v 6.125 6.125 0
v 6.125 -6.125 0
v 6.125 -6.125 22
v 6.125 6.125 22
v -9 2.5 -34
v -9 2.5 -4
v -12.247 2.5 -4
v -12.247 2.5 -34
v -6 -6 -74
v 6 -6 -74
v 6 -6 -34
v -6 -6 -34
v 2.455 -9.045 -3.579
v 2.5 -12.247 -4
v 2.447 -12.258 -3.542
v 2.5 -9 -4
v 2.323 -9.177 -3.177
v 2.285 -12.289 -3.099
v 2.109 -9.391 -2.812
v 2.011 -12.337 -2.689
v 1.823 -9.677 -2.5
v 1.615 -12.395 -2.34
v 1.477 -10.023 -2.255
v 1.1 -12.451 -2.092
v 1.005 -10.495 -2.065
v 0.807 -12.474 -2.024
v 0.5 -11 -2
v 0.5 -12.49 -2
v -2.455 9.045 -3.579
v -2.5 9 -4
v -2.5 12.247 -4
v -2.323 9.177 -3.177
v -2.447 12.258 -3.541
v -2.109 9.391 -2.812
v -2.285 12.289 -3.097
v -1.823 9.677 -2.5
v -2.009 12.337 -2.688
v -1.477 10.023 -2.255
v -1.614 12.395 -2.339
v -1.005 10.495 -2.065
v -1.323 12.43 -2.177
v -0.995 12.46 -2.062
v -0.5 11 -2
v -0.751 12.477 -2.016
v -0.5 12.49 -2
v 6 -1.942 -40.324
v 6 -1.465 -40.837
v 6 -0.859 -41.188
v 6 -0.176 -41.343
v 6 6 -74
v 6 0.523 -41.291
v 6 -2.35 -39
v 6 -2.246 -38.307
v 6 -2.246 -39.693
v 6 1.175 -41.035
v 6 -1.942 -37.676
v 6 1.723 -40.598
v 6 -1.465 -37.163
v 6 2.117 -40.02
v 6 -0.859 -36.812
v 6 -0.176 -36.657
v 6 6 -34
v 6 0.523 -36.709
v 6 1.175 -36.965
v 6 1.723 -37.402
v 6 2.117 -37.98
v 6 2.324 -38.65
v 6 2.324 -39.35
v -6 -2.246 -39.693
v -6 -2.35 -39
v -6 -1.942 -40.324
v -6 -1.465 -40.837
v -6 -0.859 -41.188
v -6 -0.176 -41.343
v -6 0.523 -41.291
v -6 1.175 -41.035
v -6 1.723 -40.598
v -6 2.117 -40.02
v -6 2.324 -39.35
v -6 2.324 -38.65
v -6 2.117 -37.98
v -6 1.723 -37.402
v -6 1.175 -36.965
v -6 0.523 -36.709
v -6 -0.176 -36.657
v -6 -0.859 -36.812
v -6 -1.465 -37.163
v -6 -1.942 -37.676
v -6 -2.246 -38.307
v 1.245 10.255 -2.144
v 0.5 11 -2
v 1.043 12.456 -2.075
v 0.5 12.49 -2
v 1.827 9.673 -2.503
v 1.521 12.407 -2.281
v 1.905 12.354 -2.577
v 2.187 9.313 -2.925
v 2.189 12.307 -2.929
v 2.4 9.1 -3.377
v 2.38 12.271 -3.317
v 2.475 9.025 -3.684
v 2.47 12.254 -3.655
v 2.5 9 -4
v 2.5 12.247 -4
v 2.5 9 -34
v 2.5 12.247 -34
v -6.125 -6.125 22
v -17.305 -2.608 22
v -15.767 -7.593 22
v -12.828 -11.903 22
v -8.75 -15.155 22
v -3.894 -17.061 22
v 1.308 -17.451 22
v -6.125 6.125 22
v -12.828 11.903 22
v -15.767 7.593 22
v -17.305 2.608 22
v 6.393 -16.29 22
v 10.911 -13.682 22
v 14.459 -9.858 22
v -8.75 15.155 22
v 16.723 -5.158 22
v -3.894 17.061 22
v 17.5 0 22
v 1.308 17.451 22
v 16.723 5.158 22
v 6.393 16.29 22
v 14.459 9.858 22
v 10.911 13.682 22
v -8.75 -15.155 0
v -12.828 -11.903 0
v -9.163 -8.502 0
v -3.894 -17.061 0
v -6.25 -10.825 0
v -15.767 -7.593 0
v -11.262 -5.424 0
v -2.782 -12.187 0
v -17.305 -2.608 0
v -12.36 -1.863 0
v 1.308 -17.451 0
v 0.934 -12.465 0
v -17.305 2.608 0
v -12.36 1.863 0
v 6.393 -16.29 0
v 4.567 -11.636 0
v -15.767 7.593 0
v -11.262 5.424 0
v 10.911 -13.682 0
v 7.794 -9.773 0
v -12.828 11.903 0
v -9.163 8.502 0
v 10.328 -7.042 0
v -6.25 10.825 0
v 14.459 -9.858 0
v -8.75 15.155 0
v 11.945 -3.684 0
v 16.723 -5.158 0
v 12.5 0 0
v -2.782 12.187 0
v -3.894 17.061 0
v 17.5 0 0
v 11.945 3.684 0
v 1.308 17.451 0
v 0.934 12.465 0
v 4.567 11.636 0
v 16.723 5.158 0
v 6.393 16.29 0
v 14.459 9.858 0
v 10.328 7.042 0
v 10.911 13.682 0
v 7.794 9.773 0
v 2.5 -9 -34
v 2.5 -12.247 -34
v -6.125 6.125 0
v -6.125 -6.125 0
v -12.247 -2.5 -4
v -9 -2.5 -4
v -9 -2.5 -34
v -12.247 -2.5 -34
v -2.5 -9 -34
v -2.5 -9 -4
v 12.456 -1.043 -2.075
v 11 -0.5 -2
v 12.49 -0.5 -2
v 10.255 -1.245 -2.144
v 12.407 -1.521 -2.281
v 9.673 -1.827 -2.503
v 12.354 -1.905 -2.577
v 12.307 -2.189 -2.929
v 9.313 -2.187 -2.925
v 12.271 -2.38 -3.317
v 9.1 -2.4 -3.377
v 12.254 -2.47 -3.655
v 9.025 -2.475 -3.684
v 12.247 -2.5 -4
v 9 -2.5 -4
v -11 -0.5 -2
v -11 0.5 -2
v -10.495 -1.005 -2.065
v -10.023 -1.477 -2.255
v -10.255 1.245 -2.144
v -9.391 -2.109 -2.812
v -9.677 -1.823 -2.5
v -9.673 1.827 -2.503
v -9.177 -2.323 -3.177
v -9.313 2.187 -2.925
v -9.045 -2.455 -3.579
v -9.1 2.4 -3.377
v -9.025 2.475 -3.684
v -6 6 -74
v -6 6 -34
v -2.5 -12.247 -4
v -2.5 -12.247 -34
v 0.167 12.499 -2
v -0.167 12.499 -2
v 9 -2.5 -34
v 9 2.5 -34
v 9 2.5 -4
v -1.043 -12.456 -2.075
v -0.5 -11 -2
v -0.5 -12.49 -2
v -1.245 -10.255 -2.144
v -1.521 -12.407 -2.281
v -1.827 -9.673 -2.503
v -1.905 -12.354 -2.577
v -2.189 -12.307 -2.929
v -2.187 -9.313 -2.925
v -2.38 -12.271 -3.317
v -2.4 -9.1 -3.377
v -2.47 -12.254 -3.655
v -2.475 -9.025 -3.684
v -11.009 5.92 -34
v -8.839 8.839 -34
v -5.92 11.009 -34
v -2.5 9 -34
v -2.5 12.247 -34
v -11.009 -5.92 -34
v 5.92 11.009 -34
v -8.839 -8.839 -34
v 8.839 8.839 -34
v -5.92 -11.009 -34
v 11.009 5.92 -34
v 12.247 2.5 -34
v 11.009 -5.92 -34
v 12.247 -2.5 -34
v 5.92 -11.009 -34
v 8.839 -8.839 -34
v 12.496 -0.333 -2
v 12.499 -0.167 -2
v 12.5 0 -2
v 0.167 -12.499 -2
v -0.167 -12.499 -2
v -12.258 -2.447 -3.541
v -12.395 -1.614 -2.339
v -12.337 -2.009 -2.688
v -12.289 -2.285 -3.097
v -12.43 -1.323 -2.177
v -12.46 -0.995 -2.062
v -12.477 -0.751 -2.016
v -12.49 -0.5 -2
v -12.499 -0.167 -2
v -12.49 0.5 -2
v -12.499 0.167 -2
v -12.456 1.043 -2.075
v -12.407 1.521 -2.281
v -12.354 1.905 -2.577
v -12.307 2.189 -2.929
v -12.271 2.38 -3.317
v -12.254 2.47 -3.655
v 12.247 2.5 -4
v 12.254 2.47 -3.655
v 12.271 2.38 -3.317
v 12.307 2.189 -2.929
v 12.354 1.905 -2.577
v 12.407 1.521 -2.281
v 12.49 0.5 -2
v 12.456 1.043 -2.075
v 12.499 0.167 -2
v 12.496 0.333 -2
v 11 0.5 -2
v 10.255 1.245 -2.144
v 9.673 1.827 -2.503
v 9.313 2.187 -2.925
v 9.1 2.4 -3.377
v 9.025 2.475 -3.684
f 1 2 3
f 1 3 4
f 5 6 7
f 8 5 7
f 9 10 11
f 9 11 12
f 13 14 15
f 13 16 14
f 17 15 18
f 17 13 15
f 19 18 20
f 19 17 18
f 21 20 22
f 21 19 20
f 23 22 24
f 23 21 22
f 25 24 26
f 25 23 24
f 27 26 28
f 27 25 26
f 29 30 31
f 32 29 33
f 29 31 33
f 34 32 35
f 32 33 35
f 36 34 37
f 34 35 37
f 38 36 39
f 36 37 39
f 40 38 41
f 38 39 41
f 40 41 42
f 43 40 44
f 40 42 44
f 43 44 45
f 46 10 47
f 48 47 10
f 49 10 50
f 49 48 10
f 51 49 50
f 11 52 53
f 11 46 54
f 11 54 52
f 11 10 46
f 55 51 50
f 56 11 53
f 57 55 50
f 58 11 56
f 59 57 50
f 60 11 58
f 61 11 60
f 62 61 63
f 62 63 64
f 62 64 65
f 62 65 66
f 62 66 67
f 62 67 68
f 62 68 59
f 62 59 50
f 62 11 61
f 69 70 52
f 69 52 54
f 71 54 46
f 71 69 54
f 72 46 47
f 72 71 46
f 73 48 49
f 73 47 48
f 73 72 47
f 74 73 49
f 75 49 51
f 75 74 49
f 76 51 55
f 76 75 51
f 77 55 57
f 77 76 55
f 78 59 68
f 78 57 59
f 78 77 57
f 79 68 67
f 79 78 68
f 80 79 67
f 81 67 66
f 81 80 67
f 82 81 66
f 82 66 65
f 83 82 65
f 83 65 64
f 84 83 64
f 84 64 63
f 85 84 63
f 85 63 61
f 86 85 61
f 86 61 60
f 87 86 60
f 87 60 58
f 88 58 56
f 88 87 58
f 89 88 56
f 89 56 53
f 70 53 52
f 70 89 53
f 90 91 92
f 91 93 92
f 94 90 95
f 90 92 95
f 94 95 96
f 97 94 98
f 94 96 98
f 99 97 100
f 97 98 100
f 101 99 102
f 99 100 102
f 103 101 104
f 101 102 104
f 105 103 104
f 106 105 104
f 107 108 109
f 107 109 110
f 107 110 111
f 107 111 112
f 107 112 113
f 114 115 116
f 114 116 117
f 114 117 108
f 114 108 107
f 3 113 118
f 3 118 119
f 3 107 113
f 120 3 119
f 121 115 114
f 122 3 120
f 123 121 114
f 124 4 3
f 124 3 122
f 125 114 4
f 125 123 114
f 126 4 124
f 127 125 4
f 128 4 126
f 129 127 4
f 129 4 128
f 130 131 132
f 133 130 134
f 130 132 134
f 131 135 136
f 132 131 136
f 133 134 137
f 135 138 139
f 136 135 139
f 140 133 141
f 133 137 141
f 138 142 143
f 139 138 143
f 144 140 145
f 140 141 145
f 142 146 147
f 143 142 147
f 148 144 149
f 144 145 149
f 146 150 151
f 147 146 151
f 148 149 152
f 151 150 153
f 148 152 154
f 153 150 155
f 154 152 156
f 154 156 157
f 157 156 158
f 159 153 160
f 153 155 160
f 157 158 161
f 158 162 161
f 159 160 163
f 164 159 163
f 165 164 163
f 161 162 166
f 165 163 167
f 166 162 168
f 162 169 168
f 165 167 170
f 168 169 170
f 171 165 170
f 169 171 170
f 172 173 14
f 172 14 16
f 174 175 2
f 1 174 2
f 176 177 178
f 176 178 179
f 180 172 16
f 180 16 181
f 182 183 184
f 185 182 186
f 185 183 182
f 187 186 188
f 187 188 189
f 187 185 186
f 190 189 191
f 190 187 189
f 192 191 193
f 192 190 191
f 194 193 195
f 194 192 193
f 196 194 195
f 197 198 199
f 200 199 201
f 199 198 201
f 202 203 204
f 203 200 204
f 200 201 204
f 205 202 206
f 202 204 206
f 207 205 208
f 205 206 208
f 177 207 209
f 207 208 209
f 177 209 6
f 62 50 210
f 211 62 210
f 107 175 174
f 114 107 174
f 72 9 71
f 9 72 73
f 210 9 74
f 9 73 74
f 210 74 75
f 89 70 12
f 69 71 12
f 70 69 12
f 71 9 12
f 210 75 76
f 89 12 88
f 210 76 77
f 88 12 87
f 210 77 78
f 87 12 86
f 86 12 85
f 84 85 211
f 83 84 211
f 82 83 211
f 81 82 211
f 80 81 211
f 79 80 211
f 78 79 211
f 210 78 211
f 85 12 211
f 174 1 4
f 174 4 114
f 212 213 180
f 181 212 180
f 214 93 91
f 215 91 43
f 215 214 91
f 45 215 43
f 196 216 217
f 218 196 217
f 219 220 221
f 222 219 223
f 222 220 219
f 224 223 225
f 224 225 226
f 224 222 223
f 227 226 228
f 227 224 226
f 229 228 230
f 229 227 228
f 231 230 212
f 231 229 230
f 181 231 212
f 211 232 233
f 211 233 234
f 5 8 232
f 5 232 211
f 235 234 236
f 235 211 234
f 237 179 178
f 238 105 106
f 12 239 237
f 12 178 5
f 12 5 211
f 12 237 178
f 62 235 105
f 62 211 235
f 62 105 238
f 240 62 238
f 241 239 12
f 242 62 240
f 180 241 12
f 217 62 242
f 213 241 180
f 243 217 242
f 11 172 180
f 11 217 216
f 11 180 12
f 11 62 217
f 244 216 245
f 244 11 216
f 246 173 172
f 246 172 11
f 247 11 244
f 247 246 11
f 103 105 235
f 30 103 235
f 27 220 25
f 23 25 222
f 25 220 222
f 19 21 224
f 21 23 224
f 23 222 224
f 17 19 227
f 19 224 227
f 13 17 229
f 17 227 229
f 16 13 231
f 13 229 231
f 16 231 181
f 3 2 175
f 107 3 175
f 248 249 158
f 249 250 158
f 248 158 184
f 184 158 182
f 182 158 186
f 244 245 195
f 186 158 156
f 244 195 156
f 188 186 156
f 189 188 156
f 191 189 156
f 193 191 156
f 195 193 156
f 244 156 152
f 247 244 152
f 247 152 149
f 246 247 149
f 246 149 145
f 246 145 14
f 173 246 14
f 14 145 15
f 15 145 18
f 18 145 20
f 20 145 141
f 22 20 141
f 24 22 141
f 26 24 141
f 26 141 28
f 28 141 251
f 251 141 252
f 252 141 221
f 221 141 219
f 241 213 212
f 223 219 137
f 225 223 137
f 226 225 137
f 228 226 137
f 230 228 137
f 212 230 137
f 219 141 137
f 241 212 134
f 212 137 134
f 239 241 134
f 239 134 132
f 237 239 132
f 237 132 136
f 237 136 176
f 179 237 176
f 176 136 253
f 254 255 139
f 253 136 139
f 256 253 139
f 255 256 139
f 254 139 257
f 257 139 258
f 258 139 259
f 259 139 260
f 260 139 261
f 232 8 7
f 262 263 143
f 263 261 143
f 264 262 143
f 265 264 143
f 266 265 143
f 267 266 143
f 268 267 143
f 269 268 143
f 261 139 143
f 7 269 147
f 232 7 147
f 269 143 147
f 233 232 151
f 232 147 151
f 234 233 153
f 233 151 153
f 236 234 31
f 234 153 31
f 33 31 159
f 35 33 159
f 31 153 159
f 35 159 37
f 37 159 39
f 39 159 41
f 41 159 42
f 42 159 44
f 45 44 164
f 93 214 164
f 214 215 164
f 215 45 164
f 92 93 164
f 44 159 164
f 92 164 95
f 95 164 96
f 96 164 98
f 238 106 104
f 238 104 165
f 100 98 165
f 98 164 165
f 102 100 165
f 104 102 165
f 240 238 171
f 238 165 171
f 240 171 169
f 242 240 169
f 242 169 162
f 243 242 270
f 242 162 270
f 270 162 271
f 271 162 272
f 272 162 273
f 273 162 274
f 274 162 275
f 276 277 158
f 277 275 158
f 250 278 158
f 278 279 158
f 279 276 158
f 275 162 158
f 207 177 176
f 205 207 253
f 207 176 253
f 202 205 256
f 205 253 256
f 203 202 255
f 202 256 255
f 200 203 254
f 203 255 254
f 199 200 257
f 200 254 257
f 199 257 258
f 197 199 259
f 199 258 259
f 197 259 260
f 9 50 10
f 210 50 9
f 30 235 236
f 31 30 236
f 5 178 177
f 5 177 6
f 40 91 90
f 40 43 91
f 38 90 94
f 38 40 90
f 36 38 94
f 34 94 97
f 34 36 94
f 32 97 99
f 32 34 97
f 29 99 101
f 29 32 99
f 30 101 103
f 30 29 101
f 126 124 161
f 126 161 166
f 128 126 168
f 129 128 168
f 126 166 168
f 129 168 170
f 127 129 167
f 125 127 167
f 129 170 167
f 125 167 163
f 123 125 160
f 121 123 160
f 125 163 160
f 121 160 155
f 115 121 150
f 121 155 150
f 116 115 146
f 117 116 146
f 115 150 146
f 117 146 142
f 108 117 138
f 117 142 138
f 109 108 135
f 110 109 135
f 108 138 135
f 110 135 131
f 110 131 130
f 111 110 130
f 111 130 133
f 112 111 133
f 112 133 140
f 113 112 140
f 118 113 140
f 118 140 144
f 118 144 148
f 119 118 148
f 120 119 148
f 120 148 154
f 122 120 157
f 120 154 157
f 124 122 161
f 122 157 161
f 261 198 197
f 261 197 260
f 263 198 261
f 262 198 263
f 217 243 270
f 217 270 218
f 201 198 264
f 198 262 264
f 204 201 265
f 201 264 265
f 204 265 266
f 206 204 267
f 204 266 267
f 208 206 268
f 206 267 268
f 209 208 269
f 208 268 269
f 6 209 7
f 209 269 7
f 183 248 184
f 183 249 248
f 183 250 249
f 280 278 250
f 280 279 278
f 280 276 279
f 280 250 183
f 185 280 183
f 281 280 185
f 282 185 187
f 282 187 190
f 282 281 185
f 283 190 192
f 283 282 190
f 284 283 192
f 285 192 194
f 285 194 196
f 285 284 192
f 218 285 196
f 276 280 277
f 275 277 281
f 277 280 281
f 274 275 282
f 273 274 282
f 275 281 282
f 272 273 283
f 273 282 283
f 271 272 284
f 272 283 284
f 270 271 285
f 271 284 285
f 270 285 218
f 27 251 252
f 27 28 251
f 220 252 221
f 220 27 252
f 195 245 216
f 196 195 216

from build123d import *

# Parameters (mm, degrees)
ESBO_O1_R                  = 17.5
RESSALTO_EXTRUS_O1_DEPTH   = 22
ESBO_O2_W                  = 12.25
ESBO_O2_H                  = 12.25
CORTE_EXTRUS_O1_DEPTH      = 25
ESBO_O3_R                  = 12.5
RESSALTO_EXTRUS_O2_DEPTH   = 34
ESBO_O4_W                  = 5
ESBO_O4_H                  = 6
ESBO_O4_W_2                = 6
ESBO_O4_H_2                = 5
CORTE_EXTRUS_O2_DEPTH      = 32
FILETE2_R                  = 2
FILETE3_R                  = 2
FILETE4_R                  = 2
FILETE5_R                  = 2
ESBO_O5_W                  = 12
ESBO_O5_H                  = 12
RESSALTO_EXTRUS_O3_DEPTH   = 40
CORTE_EXTRUS_O3_DEPTH      = 14
CORTE_EXTRUS_O3_DEPTH_BACK = 15
ESBO_O6_R                  = 2.35


with BuildPart() as part:
    # Esboço1 → Ressalto-extrusão1 (new body)
    with BuildSketch(Plane.XY):
        Circle(ESBO_O1_R)
    extrude(amount=RESSALTO_EXTRUS_O1_DEPTH)

    # Esboço2 → Corte-extrusão1 (cut)
    with BuildSketch(Plane(origin=(0, 0, 0), x_dir=(-1, 0, 0), z_dir=(0, 0, -1))):
        Rectangle(ESBO_O2_W, ESBO_O2_H)
    extrude(amount=-CORTE_EXTRUS_O1_DEPTH, mode=Mode.SUBTRACT)

    # Esboço3 → Ressalto-extrusão2 (add)
    with BuildSketch(Plane(origin=(0, 0, 0), x_dir=(-1, 0, 0), z_dir=(0, 0, -1))):
        with Locations(Location((0, 0, 0), (0, 0, 180))):
            Circle(ESBO_O3_R)
    extrude(amount=RESSALTO_EXTRUS_O2_DEPTH)

    # Esboço4 → Corte-extrusão2 (cut)
    with BuildSketch(Plane(origin=(0, 0, -34), x_dir=(-1, 0, 0), z_dir=(0, 0, -1))):
        with Locations((0, -12)):
            Rectangle(ESBO_O4_W, ESBO_O4_H)
        with Locations((0, 12)):
            Rectangle(ESBO_O4_W, ESBO_O4_H)
        with Locations((12, 0)):
            Rectangle(ESBO_O4_W_2, ESBO_O4_H_2)
        with Locations((-12, 0)):
            Rectangle(ESBO_O4_W_2, ESBO_O4_H_2)
    extrude(amount=-CORTE_EXTRUS_O2_DEPTH, mode=Mode.SUBTRACT)

    # Filete2
    filete2_edges = [part.edges().sort_by_distance(p)[0] for p in [
        (10.623724357, 2.5, -2),
        (10.623724357, -2.5, -2),
        (9, 0, -2),
    ]]
    fillet(filete2_edges, radius=FILETE2_R)

    # Filete3
    filete3_edges = [part.edges().sort_by_distance(p)[0] for p in [
        (2.5, -10.623724357, -2),
        (-2.5, -10.623724357, -2),
        (0, -9, -2),
    ]]
    fillet(filete3_edges, radius=FILETE3_R)

    # Filete4
    filete4_edges = [part.edges().sort_by_distance(p)[0] for p in [
        (-10.623724357, 2.5, -2),
        (-10.623724357, -2.5, -2),
        (-9, 0, -2),
    ]]
    fillet(filete4_edges, radius=FILETE4_R)

    # Filete5
    filete5_edges = [part.edges().sort_by_distance(p)[0] for p in [
        (2.5, 10.623724357, -2),
        (-2.5, 10.623724357, -2),
        (0, 9, -2),
    ]]
    fillet(filete5_edges, radius=FILETE5_R)

    # Esboço5 → Ressalto-extrusão3 (add)
    with BuildSketch(Plane(origin=(0, 0, -34), x_dir=(-1, 0, 0), z_dir=(0, 0, -1))):
        Rectangle(ESBO_O5_W, ESBO_O5_H)
    extrude(amount=RESSALTO_EXTRUS_O3_DEPTH)

    # Esboço6 → Corte-extrusão3 (cut, two sides: drawn at the far end of the back side and taken through both)
    with BuildSketch(Plane(origin=(6, 0, 0), x_dir=(0, 0, -1), z_dir=(1, 0, 0)).offset(-CORTE_EXTRUS_O3_DEPTH_BACK)):
        with Locations(Location((39, 0, 0), (0, 0, 270))):
            Circle(ESBO_O6_R)
    extrude(amount=CORTE_EXTRUS_O3_DEPTH + CORTE_EXTRUS_O3_DEPTH_BACK, mode=Mode.SUBTRACT)


solid = part.part
